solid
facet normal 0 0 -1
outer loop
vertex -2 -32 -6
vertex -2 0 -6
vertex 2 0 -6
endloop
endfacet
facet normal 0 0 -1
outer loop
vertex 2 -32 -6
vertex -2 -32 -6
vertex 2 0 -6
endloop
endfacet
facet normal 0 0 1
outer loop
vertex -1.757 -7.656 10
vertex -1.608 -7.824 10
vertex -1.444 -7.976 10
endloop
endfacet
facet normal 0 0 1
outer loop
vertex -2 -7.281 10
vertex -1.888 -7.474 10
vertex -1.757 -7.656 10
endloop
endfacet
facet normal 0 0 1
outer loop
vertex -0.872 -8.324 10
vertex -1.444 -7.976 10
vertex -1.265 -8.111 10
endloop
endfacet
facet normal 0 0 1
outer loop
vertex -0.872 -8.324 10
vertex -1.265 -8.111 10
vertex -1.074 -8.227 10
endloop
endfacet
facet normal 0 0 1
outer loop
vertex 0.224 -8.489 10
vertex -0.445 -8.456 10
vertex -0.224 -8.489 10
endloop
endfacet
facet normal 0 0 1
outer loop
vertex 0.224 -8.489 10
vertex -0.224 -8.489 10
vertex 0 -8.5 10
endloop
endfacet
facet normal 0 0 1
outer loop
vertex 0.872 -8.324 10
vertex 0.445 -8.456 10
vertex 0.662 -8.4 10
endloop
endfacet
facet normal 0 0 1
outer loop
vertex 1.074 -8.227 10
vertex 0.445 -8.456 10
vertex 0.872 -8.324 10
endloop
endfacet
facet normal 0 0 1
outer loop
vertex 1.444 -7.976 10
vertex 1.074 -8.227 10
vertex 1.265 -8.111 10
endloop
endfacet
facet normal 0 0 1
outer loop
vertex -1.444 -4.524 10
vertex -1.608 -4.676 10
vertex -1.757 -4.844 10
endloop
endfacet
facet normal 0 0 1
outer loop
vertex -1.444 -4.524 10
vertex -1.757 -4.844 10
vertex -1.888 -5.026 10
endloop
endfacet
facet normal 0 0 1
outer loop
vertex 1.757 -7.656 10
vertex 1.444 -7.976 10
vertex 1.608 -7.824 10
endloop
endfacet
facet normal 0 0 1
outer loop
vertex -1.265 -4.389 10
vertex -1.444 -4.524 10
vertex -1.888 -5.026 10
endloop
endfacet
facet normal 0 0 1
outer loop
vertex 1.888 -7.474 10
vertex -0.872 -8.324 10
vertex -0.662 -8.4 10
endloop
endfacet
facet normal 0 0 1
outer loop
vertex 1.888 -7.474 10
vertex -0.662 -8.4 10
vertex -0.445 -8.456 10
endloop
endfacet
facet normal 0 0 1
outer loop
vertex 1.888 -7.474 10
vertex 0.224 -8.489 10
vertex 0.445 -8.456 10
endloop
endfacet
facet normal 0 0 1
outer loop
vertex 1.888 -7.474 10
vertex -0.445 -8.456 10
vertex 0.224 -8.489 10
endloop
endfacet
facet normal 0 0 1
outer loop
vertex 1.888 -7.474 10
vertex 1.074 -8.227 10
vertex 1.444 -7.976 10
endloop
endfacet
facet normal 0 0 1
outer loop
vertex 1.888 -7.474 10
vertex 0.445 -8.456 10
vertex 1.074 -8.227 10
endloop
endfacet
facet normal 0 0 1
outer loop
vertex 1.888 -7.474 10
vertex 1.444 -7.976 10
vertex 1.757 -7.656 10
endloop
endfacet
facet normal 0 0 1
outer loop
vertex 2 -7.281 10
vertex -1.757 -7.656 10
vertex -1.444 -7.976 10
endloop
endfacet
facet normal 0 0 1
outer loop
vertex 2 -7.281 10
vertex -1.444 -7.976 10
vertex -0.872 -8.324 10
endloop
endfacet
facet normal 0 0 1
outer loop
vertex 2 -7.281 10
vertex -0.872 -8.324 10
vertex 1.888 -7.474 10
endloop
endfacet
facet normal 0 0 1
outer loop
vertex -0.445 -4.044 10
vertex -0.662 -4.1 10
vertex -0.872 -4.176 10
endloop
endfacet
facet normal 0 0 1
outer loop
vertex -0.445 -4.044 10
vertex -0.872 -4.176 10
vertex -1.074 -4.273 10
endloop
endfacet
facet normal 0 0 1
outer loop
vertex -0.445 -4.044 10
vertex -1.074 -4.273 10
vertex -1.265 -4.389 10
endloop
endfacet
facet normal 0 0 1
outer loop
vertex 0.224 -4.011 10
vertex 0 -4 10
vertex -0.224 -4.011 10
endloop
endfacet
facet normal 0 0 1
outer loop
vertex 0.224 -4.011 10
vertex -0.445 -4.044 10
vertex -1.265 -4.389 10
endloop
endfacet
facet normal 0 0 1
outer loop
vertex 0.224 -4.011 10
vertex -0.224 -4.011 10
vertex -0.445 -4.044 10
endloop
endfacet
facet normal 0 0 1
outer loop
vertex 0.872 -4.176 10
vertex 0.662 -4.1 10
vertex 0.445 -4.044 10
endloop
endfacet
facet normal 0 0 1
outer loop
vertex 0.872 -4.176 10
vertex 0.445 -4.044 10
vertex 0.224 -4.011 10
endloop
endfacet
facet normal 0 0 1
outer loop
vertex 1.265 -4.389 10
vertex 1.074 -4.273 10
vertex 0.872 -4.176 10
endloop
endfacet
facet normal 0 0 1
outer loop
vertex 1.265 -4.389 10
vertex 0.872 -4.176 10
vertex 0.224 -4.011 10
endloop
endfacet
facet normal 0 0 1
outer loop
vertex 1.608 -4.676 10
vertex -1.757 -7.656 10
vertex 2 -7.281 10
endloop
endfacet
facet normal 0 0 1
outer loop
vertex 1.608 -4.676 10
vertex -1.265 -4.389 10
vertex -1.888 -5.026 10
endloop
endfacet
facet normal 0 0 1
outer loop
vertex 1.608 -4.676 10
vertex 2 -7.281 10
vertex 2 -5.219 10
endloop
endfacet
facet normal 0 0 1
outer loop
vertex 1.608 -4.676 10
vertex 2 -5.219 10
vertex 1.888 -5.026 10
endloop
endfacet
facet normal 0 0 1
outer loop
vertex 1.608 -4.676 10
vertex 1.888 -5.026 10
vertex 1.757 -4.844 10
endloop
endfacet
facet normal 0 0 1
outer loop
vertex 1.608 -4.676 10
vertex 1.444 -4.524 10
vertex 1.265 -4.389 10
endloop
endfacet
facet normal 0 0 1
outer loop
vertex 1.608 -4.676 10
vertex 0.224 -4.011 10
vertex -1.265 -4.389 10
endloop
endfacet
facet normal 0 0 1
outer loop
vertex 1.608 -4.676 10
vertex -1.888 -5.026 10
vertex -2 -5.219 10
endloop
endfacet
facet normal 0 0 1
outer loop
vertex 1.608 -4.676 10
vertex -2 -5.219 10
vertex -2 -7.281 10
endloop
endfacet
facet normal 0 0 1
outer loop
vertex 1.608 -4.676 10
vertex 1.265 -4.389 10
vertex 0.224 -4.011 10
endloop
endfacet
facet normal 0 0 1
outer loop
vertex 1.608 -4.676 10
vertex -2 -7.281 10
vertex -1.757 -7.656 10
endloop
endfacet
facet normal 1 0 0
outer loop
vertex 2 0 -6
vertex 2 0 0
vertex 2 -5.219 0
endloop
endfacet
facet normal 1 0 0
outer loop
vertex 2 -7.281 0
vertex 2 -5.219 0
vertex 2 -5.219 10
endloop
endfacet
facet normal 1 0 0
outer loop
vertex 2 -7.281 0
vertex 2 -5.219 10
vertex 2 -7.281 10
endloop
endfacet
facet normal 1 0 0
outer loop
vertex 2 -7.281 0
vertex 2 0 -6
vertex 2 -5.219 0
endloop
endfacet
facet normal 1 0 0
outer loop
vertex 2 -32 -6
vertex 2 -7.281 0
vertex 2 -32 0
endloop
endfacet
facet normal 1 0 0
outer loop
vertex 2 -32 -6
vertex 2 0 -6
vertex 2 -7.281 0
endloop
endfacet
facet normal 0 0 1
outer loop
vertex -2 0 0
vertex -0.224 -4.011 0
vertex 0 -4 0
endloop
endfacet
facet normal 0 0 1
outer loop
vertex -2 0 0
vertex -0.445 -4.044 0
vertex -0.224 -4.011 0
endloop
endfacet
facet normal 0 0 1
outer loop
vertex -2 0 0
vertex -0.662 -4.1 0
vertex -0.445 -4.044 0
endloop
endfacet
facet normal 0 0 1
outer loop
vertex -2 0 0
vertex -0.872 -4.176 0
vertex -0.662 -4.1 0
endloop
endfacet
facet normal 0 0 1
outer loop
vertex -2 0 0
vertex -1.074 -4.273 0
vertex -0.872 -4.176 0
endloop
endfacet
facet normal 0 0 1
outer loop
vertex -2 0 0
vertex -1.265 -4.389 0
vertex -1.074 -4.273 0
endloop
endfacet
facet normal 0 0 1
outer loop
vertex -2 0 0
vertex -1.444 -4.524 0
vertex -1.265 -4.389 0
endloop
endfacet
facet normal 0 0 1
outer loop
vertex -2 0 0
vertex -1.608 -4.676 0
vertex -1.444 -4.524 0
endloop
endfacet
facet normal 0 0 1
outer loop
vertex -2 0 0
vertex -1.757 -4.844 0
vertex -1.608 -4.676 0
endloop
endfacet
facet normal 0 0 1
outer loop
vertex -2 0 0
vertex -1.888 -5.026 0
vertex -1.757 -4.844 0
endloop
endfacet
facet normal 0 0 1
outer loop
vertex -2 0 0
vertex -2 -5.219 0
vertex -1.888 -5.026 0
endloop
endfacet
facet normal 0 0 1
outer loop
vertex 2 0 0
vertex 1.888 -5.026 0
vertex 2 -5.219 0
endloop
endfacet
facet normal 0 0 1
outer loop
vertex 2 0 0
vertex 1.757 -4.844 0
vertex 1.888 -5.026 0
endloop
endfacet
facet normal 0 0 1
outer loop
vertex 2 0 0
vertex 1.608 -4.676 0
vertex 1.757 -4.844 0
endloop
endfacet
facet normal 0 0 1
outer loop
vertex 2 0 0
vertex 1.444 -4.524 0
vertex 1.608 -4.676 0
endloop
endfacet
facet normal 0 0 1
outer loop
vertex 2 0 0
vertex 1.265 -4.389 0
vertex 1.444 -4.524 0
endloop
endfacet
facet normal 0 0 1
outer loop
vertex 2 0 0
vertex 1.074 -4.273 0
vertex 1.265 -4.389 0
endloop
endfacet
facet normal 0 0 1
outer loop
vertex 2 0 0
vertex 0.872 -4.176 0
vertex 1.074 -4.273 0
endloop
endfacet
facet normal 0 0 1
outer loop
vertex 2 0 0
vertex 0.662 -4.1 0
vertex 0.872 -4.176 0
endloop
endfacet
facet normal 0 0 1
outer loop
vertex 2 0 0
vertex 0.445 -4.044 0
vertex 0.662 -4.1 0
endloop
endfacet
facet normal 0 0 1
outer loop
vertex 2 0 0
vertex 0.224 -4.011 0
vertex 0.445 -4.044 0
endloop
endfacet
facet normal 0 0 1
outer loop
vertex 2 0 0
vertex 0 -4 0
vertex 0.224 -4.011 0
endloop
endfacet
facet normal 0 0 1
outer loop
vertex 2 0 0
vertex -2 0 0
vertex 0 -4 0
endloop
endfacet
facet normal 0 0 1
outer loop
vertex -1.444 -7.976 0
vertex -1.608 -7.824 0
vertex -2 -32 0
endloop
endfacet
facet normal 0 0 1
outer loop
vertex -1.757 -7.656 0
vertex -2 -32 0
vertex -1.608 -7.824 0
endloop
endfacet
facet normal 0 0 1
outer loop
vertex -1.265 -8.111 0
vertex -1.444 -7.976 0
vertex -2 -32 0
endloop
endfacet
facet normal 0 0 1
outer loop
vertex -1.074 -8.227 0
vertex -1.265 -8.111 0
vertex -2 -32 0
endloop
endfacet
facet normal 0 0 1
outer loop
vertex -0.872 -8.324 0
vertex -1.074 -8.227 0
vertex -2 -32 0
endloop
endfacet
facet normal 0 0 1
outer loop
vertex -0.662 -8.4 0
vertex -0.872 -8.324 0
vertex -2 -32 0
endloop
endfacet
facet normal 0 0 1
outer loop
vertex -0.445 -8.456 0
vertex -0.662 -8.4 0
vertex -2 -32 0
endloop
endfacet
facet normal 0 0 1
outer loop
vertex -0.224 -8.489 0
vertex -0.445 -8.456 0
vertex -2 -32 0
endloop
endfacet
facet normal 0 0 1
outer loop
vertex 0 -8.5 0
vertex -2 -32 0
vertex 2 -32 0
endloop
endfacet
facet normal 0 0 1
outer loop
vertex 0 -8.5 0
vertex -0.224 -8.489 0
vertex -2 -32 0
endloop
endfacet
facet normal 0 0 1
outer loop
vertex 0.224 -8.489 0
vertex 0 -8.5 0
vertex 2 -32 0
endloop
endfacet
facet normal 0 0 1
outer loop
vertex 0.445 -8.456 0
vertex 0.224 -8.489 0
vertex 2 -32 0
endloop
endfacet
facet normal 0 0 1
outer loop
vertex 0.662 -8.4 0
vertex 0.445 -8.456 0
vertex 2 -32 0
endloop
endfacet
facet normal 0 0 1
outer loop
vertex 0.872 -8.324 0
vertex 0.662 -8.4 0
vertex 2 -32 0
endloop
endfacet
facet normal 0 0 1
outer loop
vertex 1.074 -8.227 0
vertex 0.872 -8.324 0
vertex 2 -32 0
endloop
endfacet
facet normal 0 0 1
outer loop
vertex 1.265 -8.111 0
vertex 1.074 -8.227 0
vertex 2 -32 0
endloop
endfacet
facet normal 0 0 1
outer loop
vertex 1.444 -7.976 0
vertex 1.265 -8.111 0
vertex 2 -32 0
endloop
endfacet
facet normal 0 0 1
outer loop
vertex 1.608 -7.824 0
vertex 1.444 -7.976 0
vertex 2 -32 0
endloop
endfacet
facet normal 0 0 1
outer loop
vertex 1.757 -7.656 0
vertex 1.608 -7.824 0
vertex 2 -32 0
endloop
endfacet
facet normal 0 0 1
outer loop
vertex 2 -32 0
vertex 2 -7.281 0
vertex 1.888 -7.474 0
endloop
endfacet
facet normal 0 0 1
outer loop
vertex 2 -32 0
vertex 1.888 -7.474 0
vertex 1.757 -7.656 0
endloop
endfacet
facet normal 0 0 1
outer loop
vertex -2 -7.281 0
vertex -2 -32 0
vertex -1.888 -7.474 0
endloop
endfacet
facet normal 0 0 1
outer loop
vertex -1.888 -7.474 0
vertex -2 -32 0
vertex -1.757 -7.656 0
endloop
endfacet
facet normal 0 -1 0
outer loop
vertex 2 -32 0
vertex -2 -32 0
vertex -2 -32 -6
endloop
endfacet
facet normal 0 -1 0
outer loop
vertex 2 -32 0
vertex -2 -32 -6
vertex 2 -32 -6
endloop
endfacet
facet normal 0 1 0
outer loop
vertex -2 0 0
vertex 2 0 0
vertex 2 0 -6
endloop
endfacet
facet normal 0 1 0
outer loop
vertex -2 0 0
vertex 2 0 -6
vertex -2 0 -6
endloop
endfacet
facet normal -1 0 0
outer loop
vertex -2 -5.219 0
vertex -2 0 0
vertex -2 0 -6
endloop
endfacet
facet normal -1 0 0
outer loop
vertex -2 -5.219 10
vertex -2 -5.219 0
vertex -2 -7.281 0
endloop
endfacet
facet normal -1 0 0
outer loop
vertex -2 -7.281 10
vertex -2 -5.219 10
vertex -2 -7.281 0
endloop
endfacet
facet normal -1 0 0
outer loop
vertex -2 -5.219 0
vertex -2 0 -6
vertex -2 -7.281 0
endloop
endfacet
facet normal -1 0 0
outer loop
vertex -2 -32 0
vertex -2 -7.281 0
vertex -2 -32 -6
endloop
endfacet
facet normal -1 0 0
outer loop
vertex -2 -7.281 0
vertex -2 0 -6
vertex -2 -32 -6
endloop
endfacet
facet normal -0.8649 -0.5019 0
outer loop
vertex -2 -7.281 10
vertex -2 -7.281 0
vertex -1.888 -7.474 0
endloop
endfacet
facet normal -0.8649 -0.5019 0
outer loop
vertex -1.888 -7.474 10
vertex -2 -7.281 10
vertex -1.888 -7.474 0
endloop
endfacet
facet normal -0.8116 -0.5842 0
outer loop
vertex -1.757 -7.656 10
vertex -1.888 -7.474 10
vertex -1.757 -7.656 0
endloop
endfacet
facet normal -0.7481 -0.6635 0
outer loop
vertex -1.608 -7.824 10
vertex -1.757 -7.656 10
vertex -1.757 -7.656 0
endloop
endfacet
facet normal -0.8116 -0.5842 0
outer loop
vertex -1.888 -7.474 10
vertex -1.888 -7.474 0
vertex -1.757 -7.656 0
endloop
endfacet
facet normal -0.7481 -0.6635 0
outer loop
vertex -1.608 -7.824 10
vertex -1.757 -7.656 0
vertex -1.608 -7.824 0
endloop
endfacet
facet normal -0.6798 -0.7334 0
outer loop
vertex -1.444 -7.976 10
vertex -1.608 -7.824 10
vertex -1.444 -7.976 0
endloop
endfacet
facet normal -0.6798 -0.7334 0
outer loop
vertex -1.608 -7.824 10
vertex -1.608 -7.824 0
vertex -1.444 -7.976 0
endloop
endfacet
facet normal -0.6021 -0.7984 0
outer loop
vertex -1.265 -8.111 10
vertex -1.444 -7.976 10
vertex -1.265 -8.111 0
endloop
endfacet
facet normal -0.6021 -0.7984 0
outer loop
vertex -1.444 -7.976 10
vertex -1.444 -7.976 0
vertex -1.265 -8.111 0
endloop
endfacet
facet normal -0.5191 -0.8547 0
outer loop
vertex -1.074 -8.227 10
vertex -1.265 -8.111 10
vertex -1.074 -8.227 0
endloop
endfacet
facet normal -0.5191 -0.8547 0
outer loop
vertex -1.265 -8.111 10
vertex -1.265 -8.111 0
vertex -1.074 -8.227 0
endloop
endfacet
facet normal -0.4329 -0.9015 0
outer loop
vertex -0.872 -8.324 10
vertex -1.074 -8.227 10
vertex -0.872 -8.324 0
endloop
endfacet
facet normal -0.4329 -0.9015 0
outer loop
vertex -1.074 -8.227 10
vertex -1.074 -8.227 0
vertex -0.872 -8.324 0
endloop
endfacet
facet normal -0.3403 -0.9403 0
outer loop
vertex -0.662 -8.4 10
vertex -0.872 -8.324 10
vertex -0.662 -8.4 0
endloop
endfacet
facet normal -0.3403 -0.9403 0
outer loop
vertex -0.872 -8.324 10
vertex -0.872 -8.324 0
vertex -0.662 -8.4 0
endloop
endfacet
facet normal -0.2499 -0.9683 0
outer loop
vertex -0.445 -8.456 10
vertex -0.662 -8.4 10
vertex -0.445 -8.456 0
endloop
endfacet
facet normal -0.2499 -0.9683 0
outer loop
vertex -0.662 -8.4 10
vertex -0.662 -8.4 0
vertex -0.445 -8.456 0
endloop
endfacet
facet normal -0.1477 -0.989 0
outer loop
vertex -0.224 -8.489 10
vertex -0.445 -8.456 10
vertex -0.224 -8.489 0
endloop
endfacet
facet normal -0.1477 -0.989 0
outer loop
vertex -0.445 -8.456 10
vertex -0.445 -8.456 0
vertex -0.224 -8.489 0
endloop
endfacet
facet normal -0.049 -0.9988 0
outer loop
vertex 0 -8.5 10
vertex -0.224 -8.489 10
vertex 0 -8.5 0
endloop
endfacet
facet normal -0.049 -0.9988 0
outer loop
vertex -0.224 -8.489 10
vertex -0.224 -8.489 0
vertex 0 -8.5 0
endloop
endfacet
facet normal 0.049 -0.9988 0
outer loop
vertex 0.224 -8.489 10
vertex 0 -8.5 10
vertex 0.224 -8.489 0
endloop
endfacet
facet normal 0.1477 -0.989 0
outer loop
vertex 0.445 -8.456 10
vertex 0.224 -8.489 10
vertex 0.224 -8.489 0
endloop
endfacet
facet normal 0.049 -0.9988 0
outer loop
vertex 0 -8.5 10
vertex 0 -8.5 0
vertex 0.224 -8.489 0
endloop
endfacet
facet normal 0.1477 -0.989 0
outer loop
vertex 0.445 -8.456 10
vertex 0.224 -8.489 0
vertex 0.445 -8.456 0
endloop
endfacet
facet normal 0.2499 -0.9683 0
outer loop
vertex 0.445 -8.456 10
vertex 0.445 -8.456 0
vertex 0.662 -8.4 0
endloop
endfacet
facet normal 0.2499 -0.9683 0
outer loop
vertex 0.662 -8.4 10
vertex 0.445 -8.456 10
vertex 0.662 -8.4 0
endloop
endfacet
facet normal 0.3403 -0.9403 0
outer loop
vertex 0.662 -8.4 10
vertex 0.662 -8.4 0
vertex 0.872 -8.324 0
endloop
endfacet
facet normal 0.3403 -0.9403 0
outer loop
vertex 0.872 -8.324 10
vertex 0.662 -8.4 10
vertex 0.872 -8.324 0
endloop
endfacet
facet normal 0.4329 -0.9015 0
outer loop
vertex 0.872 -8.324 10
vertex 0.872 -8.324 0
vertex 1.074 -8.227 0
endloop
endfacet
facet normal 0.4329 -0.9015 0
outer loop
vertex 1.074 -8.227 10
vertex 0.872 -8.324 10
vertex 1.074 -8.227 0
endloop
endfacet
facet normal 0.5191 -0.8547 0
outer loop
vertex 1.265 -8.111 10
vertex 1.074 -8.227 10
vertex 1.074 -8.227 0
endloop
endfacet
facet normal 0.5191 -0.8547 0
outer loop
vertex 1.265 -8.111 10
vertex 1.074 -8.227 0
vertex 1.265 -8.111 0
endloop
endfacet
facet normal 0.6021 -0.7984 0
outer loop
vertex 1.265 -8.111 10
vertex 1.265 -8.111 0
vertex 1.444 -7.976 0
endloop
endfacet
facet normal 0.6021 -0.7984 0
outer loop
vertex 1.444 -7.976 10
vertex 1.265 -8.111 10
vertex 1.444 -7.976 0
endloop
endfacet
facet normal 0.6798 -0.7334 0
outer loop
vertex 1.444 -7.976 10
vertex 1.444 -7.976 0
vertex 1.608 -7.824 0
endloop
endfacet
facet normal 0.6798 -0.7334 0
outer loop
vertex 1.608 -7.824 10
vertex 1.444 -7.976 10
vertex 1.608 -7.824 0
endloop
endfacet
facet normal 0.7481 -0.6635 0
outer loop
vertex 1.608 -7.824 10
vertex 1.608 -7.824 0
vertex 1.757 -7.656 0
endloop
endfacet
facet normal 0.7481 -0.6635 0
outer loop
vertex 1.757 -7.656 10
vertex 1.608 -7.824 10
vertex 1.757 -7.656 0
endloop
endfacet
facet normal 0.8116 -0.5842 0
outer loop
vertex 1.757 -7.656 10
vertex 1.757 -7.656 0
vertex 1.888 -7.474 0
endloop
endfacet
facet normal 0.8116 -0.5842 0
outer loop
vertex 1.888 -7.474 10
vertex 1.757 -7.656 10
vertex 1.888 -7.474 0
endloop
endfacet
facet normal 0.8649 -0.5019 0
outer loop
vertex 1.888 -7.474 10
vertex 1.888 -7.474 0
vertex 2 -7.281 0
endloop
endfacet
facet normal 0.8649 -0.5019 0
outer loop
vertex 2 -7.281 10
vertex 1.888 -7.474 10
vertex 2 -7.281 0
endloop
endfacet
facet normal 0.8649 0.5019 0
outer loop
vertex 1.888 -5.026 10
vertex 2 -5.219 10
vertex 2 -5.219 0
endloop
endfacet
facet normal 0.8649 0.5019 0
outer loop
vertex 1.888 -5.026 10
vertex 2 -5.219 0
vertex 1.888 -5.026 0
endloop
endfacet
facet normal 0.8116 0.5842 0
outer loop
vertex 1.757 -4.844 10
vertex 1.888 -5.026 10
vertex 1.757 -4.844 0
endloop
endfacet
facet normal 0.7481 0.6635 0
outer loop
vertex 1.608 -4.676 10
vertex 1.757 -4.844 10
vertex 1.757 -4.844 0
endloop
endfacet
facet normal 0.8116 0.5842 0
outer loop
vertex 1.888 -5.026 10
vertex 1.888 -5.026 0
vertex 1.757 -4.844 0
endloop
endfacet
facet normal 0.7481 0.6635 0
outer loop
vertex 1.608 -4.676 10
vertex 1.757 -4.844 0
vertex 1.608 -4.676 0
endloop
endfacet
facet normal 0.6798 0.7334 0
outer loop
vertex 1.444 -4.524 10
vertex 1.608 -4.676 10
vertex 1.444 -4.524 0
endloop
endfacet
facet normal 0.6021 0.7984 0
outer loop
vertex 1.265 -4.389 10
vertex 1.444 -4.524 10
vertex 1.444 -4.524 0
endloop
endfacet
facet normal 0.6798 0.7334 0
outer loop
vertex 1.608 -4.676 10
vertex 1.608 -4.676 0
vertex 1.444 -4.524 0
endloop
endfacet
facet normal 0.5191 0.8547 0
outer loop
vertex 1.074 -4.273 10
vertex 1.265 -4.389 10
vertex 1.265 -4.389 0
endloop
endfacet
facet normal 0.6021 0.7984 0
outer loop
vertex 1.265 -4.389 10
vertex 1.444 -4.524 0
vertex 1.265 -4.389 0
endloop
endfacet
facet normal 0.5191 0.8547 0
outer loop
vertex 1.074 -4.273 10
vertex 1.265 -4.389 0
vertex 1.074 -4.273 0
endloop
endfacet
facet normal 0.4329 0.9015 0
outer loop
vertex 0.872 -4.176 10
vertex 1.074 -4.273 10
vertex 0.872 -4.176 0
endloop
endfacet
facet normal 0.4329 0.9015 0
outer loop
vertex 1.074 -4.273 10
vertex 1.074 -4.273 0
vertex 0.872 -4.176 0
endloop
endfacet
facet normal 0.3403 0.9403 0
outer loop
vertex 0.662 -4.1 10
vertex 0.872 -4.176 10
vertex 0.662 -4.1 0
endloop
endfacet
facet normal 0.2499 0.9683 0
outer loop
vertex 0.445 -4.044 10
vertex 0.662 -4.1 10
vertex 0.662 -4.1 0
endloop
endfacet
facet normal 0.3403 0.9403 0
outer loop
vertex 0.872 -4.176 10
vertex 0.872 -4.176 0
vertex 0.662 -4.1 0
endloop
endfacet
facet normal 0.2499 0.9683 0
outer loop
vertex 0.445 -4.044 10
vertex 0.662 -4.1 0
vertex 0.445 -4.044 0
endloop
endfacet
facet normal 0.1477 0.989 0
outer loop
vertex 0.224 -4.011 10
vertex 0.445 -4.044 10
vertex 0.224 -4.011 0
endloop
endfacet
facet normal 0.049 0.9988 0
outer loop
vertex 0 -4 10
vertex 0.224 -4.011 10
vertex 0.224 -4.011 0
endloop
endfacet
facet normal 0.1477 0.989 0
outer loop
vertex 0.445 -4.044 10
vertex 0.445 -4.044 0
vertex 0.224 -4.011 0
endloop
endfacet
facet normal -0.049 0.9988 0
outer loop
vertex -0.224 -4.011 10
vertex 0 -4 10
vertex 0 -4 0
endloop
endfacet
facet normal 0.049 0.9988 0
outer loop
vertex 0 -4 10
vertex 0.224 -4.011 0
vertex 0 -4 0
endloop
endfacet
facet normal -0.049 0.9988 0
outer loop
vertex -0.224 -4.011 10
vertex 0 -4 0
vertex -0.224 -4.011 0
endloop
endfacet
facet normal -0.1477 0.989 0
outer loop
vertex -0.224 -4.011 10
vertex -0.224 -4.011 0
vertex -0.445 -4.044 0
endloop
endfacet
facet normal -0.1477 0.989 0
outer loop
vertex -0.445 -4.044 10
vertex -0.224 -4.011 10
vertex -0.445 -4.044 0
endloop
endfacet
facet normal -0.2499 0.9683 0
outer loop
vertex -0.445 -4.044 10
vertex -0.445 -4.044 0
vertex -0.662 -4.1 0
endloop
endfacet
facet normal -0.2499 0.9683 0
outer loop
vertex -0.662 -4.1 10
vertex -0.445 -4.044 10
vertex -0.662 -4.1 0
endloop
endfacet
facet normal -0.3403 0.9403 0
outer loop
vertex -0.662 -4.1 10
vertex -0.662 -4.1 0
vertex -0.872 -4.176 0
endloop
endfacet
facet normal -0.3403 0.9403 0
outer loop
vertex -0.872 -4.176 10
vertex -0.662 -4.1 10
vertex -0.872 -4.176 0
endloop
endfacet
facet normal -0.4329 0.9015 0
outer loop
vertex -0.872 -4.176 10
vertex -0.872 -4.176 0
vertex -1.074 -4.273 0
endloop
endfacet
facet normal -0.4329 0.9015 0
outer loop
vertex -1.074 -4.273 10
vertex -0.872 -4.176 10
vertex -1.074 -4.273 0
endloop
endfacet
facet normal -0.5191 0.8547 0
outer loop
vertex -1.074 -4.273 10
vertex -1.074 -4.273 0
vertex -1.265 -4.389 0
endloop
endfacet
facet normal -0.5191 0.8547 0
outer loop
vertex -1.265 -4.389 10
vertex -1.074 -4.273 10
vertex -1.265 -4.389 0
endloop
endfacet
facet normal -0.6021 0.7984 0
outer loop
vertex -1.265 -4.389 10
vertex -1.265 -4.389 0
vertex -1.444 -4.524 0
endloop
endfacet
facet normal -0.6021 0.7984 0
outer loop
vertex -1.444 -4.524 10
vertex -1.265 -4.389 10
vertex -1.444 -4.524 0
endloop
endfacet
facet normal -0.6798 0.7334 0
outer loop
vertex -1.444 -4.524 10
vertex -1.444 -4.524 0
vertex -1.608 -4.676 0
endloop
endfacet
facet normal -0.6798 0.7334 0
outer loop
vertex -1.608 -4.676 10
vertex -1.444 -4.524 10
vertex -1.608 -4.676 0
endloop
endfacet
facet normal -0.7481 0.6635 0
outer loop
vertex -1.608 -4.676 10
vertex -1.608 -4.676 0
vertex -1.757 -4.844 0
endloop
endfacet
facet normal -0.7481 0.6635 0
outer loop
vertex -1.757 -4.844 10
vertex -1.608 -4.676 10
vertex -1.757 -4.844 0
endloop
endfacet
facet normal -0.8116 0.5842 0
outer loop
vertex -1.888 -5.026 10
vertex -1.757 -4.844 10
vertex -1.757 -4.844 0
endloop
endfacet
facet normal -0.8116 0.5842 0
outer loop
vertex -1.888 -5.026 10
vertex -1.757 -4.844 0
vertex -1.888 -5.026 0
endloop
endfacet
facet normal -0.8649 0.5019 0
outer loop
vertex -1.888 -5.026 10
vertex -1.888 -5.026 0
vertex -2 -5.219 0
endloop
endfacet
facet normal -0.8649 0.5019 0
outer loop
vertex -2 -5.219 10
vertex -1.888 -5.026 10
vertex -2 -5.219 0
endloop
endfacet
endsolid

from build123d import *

# Parameters (mm, degrees)
F1_DEPTH = 10
F2_DEPTH = 6
F3_W     = 4
F3_H     = 32
F4_DEPTH = 16.001


with BuildPart() as f1:
    # F0 (on Top) → F1 (new body)
    with BuildSketch(Plane.XY):
        with BuildLine():
            ThreePointArc((-2.25, -6.25), (0, -8.5), (2.25, -6.25))
            ThreePointArc((2.25, -6.25), (0, -4), (-2.25, -6.25))
        make_face()
    extrude(amount=F1_DEPTH)

    # F0 (on Top) → F2 (join)
    with BuildSketch(Plane.XY):
        with BuildLine():
            ThreePointArc((-2.25, -6.25), (0, -8.5), (2.25, -6.25))
            ThreePointArc((2.25, -6.25), (0, -4), (-2.25, -6.25))
        make_face()
        with BuildLine():
            ThreePointArc((-2.25, -6.25), (0, -4), (2.25, -6.25))
            Line((2.25, -6.25), (2.25, 0))
            Line((2.25, 0), (-2.25, 0))
            Line((-2.25, 0), (-2.25, -6.25))
        make_face()
        with BuildLine():
            Line((2.25, -32), (2.25, -6.25))
            ThreePointArc((2.25, -6.25), (0, -8.5), (-2.25, -6.25))
            Line((-2.25, -6.25), (-2.25, -32))
            Line((-2.25, -32), (2.25, -32))
        make_face()
    extrude(amount=-F2_DEPTH)

    # F3 (on face) → F4 (intersect, through all)
    with BuildSketch(Plane(origin=(0, 0, -6), x_dir=(1, 0, 0), z_dir=(0, 0, -1))):
        with Locations((0, 16)):
            Rectangle(F3_W, F3_H)
    extrude(amount=-F4_DEPTH, mode=Mode.INTERSECT)


solid = f1.part
